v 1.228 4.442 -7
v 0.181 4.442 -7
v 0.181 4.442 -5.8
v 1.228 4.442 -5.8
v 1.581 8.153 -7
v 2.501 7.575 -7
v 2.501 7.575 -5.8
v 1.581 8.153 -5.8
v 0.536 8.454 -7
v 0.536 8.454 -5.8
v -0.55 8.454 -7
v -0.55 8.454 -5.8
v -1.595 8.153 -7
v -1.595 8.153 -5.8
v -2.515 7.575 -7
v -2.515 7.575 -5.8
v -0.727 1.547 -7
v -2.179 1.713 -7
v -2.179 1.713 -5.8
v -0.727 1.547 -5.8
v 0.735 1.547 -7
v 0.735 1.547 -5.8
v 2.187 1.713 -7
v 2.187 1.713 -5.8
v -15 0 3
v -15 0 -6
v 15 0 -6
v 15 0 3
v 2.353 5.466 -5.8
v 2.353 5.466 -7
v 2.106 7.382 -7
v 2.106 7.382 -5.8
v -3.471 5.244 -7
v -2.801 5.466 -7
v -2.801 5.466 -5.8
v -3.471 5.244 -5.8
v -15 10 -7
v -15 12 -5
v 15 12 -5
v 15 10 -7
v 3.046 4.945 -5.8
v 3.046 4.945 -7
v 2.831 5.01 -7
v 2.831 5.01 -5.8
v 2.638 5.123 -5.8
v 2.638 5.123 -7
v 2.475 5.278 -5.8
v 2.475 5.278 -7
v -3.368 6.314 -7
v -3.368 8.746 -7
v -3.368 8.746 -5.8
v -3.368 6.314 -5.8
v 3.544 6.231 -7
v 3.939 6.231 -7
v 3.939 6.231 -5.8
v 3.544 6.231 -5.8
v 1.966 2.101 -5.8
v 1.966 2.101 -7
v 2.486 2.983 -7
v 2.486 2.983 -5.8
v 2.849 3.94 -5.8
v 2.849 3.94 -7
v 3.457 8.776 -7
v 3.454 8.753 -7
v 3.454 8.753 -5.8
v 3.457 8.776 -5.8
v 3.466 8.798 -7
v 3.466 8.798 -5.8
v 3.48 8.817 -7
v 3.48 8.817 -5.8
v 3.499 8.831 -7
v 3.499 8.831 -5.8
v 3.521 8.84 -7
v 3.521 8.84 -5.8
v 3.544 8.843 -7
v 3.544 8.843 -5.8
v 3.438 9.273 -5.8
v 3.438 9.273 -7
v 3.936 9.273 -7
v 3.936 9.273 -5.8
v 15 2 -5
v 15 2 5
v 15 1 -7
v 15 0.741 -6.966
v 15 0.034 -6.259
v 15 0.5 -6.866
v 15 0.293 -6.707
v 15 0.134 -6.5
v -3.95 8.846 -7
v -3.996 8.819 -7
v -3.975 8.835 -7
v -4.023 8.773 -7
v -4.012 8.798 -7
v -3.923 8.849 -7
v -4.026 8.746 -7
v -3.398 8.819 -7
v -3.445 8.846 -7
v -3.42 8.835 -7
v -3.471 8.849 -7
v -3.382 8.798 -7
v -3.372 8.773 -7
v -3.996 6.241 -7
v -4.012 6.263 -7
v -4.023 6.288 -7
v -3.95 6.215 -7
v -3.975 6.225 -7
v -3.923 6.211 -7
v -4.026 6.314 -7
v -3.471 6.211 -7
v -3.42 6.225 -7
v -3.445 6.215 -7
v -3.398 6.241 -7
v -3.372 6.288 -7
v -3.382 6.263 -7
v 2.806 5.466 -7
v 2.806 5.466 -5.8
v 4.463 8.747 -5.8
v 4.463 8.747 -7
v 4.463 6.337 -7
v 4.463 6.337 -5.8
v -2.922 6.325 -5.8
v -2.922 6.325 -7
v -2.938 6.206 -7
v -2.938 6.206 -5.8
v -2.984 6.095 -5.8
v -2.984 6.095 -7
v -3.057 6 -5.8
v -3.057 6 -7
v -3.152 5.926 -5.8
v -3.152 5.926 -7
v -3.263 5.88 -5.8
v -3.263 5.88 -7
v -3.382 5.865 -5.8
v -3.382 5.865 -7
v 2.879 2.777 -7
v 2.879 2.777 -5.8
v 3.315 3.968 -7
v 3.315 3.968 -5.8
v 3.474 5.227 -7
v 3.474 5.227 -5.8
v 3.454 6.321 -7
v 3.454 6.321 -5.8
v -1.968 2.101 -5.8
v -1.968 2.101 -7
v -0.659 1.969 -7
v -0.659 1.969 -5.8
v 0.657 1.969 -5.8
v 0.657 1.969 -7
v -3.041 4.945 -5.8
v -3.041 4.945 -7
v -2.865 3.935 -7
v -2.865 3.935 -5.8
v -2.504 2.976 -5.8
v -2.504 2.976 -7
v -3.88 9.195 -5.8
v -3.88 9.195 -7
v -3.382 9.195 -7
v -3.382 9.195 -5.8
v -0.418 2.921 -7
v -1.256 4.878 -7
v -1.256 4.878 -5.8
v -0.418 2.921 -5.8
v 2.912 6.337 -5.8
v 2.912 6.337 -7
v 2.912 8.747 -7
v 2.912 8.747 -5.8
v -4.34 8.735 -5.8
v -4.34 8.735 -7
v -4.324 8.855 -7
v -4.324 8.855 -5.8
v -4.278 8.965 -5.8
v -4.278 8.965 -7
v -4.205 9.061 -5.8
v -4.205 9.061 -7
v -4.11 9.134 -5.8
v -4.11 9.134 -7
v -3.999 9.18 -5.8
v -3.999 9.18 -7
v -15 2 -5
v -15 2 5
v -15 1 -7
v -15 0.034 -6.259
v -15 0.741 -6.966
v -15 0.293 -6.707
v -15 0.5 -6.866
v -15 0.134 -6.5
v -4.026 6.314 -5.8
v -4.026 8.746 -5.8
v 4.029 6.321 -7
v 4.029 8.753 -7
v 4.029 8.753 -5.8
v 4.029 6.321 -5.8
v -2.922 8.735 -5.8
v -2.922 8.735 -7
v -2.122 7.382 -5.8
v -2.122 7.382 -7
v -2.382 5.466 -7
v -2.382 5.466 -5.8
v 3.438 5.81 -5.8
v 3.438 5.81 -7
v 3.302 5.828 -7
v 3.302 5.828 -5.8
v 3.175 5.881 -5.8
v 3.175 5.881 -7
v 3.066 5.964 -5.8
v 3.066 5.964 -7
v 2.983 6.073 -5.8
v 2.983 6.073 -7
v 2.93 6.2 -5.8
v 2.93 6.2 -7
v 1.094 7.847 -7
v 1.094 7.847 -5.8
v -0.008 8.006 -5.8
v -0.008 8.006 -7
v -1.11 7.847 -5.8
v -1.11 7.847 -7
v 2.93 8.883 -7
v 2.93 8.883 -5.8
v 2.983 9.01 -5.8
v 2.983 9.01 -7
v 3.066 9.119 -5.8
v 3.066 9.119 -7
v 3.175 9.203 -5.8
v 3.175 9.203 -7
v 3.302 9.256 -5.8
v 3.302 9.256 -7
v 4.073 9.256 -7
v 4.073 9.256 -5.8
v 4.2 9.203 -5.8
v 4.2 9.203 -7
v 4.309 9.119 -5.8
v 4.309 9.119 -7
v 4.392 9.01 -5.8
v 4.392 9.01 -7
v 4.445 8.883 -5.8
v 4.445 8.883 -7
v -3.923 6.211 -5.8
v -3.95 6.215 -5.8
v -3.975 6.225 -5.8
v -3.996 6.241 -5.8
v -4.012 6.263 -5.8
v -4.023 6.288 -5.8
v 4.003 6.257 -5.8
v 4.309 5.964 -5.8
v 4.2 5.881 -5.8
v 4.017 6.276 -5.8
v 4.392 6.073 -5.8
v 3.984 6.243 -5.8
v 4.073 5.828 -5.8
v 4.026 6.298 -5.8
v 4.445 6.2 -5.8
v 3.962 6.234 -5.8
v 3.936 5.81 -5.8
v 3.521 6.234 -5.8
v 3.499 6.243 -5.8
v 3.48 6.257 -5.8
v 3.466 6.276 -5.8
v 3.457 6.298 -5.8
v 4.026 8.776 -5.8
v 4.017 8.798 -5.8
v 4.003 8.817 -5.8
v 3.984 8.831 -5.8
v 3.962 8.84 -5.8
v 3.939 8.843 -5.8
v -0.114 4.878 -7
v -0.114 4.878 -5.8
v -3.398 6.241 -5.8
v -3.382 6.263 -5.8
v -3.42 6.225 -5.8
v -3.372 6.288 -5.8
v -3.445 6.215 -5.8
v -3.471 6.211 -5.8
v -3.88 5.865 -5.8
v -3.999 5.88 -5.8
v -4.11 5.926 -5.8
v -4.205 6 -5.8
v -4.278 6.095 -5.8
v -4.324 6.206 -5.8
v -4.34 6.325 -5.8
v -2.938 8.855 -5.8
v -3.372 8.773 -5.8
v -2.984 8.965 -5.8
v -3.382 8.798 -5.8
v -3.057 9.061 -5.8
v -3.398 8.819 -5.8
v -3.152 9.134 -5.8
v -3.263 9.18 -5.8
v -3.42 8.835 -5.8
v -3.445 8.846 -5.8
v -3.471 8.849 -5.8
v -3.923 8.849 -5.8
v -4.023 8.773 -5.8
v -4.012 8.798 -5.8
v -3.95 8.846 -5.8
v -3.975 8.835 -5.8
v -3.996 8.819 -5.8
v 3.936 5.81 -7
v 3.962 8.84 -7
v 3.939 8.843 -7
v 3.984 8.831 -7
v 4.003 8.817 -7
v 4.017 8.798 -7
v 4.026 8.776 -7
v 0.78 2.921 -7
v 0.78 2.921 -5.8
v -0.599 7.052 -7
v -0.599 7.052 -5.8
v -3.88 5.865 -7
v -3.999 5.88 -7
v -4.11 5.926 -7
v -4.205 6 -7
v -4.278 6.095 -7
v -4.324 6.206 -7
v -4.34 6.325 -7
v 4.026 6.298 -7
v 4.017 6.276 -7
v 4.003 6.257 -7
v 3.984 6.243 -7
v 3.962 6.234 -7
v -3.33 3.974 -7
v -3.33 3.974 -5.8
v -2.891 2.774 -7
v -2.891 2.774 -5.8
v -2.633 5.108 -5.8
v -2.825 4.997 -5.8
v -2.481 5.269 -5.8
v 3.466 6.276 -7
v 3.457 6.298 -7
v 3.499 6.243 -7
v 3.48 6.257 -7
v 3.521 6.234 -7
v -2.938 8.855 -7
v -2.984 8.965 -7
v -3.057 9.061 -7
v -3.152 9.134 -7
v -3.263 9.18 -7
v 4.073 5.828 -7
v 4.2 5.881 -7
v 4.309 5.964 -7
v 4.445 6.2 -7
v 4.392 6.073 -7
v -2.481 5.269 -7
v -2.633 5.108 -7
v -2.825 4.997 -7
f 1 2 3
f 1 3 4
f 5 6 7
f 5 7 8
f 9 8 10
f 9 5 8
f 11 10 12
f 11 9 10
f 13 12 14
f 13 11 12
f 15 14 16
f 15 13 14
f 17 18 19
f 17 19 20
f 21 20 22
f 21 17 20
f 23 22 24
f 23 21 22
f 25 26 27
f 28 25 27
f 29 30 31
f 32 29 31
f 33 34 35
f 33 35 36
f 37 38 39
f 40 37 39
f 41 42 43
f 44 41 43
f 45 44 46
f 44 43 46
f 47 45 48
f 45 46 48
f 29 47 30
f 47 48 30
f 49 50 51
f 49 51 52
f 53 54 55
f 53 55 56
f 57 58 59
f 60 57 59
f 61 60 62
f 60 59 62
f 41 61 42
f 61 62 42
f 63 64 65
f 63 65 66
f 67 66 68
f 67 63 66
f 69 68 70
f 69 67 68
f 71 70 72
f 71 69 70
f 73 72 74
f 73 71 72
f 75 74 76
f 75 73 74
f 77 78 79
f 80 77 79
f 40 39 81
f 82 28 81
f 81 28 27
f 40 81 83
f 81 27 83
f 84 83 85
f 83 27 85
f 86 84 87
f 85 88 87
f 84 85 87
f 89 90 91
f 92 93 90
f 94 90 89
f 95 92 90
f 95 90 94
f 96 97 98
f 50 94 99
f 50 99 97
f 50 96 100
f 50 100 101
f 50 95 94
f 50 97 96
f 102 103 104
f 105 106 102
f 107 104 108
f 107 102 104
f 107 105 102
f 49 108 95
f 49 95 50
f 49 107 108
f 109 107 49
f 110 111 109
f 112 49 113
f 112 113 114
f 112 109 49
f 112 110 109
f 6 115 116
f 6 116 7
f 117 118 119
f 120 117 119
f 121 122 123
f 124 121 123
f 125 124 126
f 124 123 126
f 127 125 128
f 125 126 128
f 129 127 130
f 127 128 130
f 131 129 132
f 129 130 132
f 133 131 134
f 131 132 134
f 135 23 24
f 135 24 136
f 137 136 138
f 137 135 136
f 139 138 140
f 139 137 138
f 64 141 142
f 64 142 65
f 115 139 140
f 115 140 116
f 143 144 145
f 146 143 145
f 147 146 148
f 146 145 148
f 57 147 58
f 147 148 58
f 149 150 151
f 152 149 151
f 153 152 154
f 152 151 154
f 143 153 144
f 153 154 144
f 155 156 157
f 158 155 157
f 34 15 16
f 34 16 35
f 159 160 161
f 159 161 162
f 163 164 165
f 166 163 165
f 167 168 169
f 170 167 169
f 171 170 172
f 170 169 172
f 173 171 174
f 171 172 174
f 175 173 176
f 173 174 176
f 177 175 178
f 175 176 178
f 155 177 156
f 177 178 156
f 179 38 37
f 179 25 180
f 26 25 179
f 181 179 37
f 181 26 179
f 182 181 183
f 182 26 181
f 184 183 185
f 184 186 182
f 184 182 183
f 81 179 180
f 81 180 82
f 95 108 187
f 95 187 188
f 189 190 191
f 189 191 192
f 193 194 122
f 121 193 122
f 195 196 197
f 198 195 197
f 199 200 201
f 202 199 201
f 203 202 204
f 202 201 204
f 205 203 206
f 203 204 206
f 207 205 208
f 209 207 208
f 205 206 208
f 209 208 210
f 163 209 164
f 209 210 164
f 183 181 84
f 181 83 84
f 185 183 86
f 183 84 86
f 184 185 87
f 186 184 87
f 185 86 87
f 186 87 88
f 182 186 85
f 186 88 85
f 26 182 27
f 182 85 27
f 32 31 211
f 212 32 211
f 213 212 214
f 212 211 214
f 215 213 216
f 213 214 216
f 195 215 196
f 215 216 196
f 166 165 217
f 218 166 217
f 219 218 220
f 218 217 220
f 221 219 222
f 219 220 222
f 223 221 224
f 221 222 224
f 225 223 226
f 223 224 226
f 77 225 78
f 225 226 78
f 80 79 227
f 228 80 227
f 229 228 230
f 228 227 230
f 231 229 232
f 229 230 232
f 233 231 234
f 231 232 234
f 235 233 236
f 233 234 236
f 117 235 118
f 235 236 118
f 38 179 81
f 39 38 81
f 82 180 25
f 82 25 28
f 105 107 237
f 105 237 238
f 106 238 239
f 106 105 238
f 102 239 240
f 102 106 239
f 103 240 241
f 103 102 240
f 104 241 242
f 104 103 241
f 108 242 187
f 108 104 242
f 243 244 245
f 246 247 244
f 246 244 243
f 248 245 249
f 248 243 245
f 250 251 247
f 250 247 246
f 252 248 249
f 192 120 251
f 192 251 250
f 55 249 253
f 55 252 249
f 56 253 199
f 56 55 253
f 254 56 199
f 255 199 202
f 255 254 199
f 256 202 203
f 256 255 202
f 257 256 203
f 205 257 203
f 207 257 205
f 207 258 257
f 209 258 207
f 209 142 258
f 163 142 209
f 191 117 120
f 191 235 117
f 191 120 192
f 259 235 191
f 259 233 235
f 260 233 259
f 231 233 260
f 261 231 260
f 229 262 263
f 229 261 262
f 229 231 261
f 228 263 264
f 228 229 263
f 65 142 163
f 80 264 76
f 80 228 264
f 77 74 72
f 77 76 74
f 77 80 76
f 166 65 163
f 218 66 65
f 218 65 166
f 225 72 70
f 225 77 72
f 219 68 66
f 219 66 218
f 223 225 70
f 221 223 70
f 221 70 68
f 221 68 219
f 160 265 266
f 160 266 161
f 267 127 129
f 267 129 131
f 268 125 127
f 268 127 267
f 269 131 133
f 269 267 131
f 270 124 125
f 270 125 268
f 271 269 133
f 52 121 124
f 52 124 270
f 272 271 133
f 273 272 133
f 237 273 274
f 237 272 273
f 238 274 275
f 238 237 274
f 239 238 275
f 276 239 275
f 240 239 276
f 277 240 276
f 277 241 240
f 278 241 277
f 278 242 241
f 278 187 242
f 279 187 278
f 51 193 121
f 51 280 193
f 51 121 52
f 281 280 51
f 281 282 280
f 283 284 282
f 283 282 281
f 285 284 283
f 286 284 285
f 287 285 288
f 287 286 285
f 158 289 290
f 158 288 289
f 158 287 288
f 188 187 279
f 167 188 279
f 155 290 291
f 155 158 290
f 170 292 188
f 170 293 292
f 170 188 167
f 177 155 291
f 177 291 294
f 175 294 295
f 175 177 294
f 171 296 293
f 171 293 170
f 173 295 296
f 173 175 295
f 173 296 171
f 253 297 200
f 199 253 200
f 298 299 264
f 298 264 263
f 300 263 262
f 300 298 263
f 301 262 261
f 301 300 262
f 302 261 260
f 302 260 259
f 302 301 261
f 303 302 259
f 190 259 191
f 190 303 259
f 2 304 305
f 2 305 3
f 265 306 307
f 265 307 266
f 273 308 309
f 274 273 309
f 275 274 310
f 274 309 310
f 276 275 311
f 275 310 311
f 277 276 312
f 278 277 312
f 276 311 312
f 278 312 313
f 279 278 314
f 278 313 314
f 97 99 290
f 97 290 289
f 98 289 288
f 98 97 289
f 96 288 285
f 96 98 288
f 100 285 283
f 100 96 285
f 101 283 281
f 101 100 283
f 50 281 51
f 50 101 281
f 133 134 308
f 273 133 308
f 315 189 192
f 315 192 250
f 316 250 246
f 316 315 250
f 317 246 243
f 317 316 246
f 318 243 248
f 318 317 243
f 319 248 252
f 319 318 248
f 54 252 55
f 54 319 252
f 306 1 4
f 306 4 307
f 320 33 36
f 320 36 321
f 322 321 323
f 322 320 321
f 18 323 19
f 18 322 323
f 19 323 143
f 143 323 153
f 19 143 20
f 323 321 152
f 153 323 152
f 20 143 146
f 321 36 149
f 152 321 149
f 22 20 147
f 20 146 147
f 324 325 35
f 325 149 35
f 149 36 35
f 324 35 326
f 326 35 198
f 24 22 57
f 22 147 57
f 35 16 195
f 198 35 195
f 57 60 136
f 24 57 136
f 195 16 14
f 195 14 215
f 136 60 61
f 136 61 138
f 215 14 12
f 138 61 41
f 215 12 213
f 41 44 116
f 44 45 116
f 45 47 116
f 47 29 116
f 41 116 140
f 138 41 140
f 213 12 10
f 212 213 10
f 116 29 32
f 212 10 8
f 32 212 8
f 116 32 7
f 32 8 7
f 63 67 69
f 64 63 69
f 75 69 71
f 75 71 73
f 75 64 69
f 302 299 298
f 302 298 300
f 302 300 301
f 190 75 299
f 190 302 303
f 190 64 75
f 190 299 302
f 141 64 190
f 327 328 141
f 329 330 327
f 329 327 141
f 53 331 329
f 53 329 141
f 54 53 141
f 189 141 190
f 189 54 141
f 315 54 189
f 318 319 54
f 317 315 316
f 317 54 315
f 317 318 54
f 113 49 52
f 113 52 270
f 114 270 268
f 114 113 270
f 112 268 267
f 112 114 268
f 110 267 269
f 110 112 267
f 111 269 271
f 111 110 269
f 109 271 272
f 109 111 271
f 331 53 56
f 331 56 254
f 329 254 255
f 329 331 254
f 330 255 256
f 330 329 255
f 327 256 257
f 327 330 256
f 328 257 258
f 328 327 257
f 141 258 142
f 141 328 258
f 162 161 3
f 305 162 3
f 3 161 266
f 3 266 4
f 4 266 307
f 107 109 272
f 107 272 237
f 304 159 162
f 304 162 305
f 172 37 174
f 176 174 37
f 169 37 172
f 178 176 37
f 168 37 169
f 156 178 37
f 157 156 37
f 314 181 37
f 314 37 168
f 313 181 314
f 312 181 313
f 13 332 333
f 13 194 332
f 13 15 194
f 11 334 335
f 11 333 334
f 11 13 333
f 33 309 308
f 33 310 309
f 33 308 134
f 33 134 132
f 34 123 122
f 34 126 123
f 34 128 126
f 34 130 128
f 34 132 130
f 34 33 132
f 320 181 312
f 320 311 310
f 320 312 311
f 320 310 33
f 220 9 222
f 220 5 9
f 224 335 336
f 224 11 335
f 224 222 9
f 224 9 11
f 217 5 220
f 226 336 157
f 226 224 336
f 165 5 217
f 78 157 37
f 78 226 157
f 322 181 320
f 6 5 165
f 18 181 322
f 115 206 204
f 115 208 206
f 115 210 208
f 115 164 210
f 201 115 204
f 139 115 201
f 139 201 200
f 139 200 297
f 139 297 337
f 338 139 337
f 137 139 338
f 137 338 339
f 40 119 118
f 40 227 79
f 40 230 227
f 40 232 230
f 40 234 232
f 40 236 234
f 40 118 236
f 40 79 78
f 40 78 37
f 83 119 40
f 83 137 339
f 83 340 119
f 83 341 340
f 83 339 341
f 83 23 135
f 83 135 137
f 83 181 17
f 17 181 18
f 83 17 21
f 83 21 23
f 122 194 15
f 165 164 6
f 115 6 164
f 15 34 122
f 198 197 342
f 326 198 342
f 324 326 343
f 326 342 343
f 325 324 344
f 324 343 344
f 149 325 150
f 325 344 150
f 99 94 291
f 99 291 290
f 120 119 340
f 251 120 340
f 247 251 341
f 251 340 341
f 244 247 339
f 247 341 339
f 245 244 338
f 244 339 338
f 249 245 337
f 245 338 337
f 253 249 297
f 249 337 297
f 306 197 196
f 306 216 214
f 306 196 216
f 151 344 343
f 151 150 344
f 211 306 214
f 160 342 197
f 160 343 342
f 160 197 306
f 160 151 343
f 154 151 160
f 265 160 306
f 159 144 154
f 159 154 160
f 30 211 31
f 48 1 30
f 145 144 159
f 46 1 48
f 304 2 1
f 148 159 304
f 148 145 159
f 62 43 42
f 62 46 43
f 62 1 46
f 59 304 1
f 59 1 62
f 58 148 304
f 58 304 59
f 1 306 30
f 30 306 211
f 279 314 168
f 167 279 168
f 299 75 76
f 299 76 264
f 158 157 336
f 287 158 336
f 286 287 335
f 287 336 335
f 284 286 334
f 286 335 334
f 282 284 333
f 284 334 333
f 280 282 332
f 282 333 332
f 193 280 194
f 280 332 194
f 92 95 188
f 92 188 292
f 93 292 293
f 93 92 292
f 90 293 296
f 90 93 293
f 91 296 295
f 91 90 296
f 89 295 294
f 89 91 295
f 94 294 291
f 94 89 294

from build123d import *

# Parameters (mm, degrees)
CROQUIS1_W                   = 30
CROQUIS1_H                   = 10
SALIENTE_EXTRUIR1_DEPTH      = 2
SALIENTE_EXTRUIR2_DEPTH      = 10
SALIENTE_EXTRUIR2_DEPTH_BACK = 2
CROQUIS2_W                   = 30
CROQUIS2_H                   = 2
CHAFL_N1_SIZE                = 2
REDONDEO2_R                  = 1
CHAFL_N2_SIZE                = 2
CORTAR_EXTRUIR1_DEPTH        = 1.2


with BuildPart() as part:
    # Croquis1 → Saliente-Extruir1 (new body)
    with BuildSketch(Plane(origin=(0, 0, 0), x_dir=(1, 0, 0), z_dir=(0, 1, 0))):
        Rectangle(CROQUIS1_W, CROQUIS1_H)
    extrude(amount=SALIENTE_EXTRUIR1_DEPTH)

    # Croquis2 → Saliente-Extruir2 (add, two sides: drawn at the far end of the back side and taken through both)
    with BuildSketch(Plane(origin=(0, 2, 0), x_dir=(1, 0, 0), z_dir=(0, 1, 0)).offset(-SALIENTE_EXTRUIR2_DEPTH_BACK)):
        with Locations((0, 6)):
            Rectangle(CROQUIS2_W, CROQUIS2_H)
    extrude(amount=SALIENTE_EXTRUIR2_DEPTH + SALIENTE_EXTRUIR2_DEPTH_BACK)

    # Chaflán1
    chafl_n1_edges = [part.edges().sort_by_distance(p)[0] for p in [
        (0, 12, -7),
    ]]
    chamfer(chafl_n1_edges, length=CHAFL_N1_SIZE - 0.0001)  # a hair under: the kernel refuses the full size

    # Redondeo2
    redondeo2_edges = [part.edges().sort_by_distance(p)[0] for p in [
        (0, 0, -7),
    ]]
    fillet(redondeo2_edges, radius=REDONDEO2_R)

    # Chaflán2
    chafl_n2_edges = [part.edges().sort_by_distance(p)[0] for p in [
        (0, 0, 5),
    ]]
    chamfer(chafl_n2_edges, length=CHAFL_N2_SIZE - 0.0001)  # a hair under: the kernel refuses the full size

    # Croquis3 → Cortar-Extruir1 (cut)
    # profile 1 of 4: a face of its own
    with BuildSketch(Plane(origin=(0, 0, -7), x_dir=(-1, 0, 0), z_dir=(0, 0, -1))):
        with BuildLine():
            ThreePointArc((2.179461585, 1.712836764), (-0.003829875, 1.526509248), (-2.187121335, 1.712836764))
            ThreePointArc((-2.187121335, 1.712836764), (-3.13057186, 3.360317888), (-3.474170032, 5.227463636))
            Line((-3.474170032, 5.227463636), (-2.805590027, 5.46631384))
            Line((-2.805590027, 5.46631384), (-2.500896715, 7.575051077))
            ThreePointArc((-2.500896715, 7.575051077), (0.006930249, 8.492471905), (2.514756719, 7.575049726))
            Line((2.514756719, 7.575049726), (2.800592253, 5.46631384))
            Line((2.800592253, 5.46631384), (3.47129645, 5.243848676))
            ThreePointArc((3.47129645, 5.243848676), (3.146201029, 3.360968701), (2.179461585, 1.712836764))
        make_face()
        with BuildLine():
            ThreePointArc((3.04052308, 4.945192572), (2.706972006, 3.446787944), (1.968364572, 2.101079281))
            ThreePointArc((1.968364572, 2.101079281), (0.001181819, 1.952323974), (-1.966000935, 2.101079281))
            ThreePointArc((-1.966000935, 2.101079281), (-2.687956628, 3.454054765), (-3.046105657, 4.945192572))
            ThreePointArc((-3.046105657, 4.945192572), (-2.637562578, 5.123424768), (-2.352779772, 5.46631384))
            Line((-2.352779772, 5.46631384), (-2.105696131, 7.381547512))
            ThreePointArc((-2.105696131, 7.381547512), (0.008132207, 8.005941127), (2.121960546, 7.381547512))
            Line((2.121960546, 7.381547512), (2.381567187, 5.46631384))
            ThreePointArc((2.381567187, 5.46631384), (2.633474347, 5.107665237), (3.04052308, 4.945192572))
        make_face(mode=Mode.SUBTRACT)
    # profile 2 of 4: a face of its own
    with BuildSketch(Plane(origin=(0, 0, -7), x_dir=(-1, 0, 0), z_dir=(0, 0, -1))):
        with BuildLine():
            Line((2.92199069, 8.735458595), (2.92199069, 6.324796966))
            ThreePointArc((2.92199069, 6.324796966), (3.056721571, 5.999527847), (3.38199069, 5.864796966))
            Line((3.38199069, 5.864796966), (3.880095869, 5.864796966))
            ThreePointArc((3.880095869, 5.864796966), (4.205364988, 5.999527847), (4.340095869, 6.324796966))
            Line((4.340095869, 6.324796966), (4.340095869, 8.735458595))
            ThreePointArc((4.340095869, 8.735458595), (4.205364988, 9.060727715), (3.880095869, 9.195458595))
            Line((3.880095869, 9.195458595), (3.38199069, 9.195458595))
            ThreePointArc((3.38199069, 9.195458595), (3.056721571, 9.060727715), (2.92199069, 8.735458595))
        make_face()
        with BuildLine():
            ThreePointArc((3.47129645, 8.849051475), (3.398492736, 8.818895189), (3.36833645, 8.746091475))
            Line((3.36833645, 8.746091475), (3.36833645, 6.314164086))
            ThreePointArc((3.36833645, 6.314164086), (3.398492736, 6.241360372), (3.47129645, 6.211204086))
            Line((3.47129645, 6.211204086), (3.923270109, 6.211204086))
            ThreePointArc((3.923270109, 6.211204086), (3.996073823, 6.241360372), (4.026230109, 6.314164086))
            Line((4.026230109, 6.314164086), (4.026230109, 8.746091475))
            ThreePointArc((4.026230109, 8.746091475), (3.996073823, 8.818895189), (3.923270109, 8.849051475))
            Line((3.923270109, 8.849051475), (3.47129645, 8.849051475))
        make_face(mode=Mode.SUBTRACT)
    # profile 3 of 4: a face of its own
    with BuildSketch(Plane(origin=(0, 0, -7), x_dir=(-1, 0, 0), z_dir=(0, 0, -1))):
        Polygon((1.255664584, 4.877844546), (0.417947415, 2.921183382), (-0.779631115, 2.921183382), (-0.18084185, 4.441551322), (-1.228472775, 4.441551322), (0.599464258, 7.052448867), (0.113938081, 4.877844546), align=None)
    # profile 4 of 4: a face of its own
    with BuildSketch(Plane(origin=(0, 0, -7), x_dir=(-1, 0, 0), z_dir=(0, 0, -1))):
        with BuildLine():
            Line((-4.462655299, 8.747249221), (-4.462655299, 6.336587592))
            ThreePointArc((-4.462655299, 6.336587592), (-4.308523171, 5.964479719), (-3.936415299, 5.810347592))
            Line((-3.936415299, 5.810347592), (-3.43831012, 5.810347592))
            ThreePointArc((-3.43831012, 5.810347592), (-3.066202247, 5.964479719), (-2.91207012, 6.336587592))
            Line((-2.91207012, 6.336587592), (-2.91207012, 8.747249221))
            ThreePointArc((-2.91207012, 8.747249221), (-3.066202247, 9.119357093), (-3.43831012, 9.273489221))
            Line((-3.43831012, 9.273489221), (-3.936415299, 9.273489221))
            ThreePointArc((-3.936415299, 9.273489221), (-4.308523171, 9.119357093), (-4.462655299, 8.747249221))
        make_face()
        with BuildLine():
            ThreePointArc((-3.939103691, 8.842918202), (-4.002743301, 8.816557812), (-4.029103691, 8.752918202))
            Line((-4.029103691, 8.752918202), (-4.029103691, 6.320990813))
            ThreePointArc((-4.029103691, 6.320990813), (-4.002743301, 6.257351203), (-3.939103691, 6.230990813))
            Line((-3.939103691, 6.230990813), (-3.544021822, 6.230990813))
            ThreePointArc((-3.544021822, 6.230990813), (-3.480382211, 6.257351203), (-3.454021822, 6.320990813))
            Line((-3.454021822, 6.320990813), (-3.454021822, 8.752918202))
            ThreePointArc((-3.454021822, 8.752918202), (-3.480382211, 8.816557812), (-3.544021822, 8.842918202))
            Line((-3.544021822, 8.842918202), (-3.939103691, 8.842918202))
        make_face(mode=Mode.SUBTRACT)
    extrude(amount=-CORTAR_EXTRUIR1_DEPTH, mode=Mode.SUBTRACT)


solid = part.part
